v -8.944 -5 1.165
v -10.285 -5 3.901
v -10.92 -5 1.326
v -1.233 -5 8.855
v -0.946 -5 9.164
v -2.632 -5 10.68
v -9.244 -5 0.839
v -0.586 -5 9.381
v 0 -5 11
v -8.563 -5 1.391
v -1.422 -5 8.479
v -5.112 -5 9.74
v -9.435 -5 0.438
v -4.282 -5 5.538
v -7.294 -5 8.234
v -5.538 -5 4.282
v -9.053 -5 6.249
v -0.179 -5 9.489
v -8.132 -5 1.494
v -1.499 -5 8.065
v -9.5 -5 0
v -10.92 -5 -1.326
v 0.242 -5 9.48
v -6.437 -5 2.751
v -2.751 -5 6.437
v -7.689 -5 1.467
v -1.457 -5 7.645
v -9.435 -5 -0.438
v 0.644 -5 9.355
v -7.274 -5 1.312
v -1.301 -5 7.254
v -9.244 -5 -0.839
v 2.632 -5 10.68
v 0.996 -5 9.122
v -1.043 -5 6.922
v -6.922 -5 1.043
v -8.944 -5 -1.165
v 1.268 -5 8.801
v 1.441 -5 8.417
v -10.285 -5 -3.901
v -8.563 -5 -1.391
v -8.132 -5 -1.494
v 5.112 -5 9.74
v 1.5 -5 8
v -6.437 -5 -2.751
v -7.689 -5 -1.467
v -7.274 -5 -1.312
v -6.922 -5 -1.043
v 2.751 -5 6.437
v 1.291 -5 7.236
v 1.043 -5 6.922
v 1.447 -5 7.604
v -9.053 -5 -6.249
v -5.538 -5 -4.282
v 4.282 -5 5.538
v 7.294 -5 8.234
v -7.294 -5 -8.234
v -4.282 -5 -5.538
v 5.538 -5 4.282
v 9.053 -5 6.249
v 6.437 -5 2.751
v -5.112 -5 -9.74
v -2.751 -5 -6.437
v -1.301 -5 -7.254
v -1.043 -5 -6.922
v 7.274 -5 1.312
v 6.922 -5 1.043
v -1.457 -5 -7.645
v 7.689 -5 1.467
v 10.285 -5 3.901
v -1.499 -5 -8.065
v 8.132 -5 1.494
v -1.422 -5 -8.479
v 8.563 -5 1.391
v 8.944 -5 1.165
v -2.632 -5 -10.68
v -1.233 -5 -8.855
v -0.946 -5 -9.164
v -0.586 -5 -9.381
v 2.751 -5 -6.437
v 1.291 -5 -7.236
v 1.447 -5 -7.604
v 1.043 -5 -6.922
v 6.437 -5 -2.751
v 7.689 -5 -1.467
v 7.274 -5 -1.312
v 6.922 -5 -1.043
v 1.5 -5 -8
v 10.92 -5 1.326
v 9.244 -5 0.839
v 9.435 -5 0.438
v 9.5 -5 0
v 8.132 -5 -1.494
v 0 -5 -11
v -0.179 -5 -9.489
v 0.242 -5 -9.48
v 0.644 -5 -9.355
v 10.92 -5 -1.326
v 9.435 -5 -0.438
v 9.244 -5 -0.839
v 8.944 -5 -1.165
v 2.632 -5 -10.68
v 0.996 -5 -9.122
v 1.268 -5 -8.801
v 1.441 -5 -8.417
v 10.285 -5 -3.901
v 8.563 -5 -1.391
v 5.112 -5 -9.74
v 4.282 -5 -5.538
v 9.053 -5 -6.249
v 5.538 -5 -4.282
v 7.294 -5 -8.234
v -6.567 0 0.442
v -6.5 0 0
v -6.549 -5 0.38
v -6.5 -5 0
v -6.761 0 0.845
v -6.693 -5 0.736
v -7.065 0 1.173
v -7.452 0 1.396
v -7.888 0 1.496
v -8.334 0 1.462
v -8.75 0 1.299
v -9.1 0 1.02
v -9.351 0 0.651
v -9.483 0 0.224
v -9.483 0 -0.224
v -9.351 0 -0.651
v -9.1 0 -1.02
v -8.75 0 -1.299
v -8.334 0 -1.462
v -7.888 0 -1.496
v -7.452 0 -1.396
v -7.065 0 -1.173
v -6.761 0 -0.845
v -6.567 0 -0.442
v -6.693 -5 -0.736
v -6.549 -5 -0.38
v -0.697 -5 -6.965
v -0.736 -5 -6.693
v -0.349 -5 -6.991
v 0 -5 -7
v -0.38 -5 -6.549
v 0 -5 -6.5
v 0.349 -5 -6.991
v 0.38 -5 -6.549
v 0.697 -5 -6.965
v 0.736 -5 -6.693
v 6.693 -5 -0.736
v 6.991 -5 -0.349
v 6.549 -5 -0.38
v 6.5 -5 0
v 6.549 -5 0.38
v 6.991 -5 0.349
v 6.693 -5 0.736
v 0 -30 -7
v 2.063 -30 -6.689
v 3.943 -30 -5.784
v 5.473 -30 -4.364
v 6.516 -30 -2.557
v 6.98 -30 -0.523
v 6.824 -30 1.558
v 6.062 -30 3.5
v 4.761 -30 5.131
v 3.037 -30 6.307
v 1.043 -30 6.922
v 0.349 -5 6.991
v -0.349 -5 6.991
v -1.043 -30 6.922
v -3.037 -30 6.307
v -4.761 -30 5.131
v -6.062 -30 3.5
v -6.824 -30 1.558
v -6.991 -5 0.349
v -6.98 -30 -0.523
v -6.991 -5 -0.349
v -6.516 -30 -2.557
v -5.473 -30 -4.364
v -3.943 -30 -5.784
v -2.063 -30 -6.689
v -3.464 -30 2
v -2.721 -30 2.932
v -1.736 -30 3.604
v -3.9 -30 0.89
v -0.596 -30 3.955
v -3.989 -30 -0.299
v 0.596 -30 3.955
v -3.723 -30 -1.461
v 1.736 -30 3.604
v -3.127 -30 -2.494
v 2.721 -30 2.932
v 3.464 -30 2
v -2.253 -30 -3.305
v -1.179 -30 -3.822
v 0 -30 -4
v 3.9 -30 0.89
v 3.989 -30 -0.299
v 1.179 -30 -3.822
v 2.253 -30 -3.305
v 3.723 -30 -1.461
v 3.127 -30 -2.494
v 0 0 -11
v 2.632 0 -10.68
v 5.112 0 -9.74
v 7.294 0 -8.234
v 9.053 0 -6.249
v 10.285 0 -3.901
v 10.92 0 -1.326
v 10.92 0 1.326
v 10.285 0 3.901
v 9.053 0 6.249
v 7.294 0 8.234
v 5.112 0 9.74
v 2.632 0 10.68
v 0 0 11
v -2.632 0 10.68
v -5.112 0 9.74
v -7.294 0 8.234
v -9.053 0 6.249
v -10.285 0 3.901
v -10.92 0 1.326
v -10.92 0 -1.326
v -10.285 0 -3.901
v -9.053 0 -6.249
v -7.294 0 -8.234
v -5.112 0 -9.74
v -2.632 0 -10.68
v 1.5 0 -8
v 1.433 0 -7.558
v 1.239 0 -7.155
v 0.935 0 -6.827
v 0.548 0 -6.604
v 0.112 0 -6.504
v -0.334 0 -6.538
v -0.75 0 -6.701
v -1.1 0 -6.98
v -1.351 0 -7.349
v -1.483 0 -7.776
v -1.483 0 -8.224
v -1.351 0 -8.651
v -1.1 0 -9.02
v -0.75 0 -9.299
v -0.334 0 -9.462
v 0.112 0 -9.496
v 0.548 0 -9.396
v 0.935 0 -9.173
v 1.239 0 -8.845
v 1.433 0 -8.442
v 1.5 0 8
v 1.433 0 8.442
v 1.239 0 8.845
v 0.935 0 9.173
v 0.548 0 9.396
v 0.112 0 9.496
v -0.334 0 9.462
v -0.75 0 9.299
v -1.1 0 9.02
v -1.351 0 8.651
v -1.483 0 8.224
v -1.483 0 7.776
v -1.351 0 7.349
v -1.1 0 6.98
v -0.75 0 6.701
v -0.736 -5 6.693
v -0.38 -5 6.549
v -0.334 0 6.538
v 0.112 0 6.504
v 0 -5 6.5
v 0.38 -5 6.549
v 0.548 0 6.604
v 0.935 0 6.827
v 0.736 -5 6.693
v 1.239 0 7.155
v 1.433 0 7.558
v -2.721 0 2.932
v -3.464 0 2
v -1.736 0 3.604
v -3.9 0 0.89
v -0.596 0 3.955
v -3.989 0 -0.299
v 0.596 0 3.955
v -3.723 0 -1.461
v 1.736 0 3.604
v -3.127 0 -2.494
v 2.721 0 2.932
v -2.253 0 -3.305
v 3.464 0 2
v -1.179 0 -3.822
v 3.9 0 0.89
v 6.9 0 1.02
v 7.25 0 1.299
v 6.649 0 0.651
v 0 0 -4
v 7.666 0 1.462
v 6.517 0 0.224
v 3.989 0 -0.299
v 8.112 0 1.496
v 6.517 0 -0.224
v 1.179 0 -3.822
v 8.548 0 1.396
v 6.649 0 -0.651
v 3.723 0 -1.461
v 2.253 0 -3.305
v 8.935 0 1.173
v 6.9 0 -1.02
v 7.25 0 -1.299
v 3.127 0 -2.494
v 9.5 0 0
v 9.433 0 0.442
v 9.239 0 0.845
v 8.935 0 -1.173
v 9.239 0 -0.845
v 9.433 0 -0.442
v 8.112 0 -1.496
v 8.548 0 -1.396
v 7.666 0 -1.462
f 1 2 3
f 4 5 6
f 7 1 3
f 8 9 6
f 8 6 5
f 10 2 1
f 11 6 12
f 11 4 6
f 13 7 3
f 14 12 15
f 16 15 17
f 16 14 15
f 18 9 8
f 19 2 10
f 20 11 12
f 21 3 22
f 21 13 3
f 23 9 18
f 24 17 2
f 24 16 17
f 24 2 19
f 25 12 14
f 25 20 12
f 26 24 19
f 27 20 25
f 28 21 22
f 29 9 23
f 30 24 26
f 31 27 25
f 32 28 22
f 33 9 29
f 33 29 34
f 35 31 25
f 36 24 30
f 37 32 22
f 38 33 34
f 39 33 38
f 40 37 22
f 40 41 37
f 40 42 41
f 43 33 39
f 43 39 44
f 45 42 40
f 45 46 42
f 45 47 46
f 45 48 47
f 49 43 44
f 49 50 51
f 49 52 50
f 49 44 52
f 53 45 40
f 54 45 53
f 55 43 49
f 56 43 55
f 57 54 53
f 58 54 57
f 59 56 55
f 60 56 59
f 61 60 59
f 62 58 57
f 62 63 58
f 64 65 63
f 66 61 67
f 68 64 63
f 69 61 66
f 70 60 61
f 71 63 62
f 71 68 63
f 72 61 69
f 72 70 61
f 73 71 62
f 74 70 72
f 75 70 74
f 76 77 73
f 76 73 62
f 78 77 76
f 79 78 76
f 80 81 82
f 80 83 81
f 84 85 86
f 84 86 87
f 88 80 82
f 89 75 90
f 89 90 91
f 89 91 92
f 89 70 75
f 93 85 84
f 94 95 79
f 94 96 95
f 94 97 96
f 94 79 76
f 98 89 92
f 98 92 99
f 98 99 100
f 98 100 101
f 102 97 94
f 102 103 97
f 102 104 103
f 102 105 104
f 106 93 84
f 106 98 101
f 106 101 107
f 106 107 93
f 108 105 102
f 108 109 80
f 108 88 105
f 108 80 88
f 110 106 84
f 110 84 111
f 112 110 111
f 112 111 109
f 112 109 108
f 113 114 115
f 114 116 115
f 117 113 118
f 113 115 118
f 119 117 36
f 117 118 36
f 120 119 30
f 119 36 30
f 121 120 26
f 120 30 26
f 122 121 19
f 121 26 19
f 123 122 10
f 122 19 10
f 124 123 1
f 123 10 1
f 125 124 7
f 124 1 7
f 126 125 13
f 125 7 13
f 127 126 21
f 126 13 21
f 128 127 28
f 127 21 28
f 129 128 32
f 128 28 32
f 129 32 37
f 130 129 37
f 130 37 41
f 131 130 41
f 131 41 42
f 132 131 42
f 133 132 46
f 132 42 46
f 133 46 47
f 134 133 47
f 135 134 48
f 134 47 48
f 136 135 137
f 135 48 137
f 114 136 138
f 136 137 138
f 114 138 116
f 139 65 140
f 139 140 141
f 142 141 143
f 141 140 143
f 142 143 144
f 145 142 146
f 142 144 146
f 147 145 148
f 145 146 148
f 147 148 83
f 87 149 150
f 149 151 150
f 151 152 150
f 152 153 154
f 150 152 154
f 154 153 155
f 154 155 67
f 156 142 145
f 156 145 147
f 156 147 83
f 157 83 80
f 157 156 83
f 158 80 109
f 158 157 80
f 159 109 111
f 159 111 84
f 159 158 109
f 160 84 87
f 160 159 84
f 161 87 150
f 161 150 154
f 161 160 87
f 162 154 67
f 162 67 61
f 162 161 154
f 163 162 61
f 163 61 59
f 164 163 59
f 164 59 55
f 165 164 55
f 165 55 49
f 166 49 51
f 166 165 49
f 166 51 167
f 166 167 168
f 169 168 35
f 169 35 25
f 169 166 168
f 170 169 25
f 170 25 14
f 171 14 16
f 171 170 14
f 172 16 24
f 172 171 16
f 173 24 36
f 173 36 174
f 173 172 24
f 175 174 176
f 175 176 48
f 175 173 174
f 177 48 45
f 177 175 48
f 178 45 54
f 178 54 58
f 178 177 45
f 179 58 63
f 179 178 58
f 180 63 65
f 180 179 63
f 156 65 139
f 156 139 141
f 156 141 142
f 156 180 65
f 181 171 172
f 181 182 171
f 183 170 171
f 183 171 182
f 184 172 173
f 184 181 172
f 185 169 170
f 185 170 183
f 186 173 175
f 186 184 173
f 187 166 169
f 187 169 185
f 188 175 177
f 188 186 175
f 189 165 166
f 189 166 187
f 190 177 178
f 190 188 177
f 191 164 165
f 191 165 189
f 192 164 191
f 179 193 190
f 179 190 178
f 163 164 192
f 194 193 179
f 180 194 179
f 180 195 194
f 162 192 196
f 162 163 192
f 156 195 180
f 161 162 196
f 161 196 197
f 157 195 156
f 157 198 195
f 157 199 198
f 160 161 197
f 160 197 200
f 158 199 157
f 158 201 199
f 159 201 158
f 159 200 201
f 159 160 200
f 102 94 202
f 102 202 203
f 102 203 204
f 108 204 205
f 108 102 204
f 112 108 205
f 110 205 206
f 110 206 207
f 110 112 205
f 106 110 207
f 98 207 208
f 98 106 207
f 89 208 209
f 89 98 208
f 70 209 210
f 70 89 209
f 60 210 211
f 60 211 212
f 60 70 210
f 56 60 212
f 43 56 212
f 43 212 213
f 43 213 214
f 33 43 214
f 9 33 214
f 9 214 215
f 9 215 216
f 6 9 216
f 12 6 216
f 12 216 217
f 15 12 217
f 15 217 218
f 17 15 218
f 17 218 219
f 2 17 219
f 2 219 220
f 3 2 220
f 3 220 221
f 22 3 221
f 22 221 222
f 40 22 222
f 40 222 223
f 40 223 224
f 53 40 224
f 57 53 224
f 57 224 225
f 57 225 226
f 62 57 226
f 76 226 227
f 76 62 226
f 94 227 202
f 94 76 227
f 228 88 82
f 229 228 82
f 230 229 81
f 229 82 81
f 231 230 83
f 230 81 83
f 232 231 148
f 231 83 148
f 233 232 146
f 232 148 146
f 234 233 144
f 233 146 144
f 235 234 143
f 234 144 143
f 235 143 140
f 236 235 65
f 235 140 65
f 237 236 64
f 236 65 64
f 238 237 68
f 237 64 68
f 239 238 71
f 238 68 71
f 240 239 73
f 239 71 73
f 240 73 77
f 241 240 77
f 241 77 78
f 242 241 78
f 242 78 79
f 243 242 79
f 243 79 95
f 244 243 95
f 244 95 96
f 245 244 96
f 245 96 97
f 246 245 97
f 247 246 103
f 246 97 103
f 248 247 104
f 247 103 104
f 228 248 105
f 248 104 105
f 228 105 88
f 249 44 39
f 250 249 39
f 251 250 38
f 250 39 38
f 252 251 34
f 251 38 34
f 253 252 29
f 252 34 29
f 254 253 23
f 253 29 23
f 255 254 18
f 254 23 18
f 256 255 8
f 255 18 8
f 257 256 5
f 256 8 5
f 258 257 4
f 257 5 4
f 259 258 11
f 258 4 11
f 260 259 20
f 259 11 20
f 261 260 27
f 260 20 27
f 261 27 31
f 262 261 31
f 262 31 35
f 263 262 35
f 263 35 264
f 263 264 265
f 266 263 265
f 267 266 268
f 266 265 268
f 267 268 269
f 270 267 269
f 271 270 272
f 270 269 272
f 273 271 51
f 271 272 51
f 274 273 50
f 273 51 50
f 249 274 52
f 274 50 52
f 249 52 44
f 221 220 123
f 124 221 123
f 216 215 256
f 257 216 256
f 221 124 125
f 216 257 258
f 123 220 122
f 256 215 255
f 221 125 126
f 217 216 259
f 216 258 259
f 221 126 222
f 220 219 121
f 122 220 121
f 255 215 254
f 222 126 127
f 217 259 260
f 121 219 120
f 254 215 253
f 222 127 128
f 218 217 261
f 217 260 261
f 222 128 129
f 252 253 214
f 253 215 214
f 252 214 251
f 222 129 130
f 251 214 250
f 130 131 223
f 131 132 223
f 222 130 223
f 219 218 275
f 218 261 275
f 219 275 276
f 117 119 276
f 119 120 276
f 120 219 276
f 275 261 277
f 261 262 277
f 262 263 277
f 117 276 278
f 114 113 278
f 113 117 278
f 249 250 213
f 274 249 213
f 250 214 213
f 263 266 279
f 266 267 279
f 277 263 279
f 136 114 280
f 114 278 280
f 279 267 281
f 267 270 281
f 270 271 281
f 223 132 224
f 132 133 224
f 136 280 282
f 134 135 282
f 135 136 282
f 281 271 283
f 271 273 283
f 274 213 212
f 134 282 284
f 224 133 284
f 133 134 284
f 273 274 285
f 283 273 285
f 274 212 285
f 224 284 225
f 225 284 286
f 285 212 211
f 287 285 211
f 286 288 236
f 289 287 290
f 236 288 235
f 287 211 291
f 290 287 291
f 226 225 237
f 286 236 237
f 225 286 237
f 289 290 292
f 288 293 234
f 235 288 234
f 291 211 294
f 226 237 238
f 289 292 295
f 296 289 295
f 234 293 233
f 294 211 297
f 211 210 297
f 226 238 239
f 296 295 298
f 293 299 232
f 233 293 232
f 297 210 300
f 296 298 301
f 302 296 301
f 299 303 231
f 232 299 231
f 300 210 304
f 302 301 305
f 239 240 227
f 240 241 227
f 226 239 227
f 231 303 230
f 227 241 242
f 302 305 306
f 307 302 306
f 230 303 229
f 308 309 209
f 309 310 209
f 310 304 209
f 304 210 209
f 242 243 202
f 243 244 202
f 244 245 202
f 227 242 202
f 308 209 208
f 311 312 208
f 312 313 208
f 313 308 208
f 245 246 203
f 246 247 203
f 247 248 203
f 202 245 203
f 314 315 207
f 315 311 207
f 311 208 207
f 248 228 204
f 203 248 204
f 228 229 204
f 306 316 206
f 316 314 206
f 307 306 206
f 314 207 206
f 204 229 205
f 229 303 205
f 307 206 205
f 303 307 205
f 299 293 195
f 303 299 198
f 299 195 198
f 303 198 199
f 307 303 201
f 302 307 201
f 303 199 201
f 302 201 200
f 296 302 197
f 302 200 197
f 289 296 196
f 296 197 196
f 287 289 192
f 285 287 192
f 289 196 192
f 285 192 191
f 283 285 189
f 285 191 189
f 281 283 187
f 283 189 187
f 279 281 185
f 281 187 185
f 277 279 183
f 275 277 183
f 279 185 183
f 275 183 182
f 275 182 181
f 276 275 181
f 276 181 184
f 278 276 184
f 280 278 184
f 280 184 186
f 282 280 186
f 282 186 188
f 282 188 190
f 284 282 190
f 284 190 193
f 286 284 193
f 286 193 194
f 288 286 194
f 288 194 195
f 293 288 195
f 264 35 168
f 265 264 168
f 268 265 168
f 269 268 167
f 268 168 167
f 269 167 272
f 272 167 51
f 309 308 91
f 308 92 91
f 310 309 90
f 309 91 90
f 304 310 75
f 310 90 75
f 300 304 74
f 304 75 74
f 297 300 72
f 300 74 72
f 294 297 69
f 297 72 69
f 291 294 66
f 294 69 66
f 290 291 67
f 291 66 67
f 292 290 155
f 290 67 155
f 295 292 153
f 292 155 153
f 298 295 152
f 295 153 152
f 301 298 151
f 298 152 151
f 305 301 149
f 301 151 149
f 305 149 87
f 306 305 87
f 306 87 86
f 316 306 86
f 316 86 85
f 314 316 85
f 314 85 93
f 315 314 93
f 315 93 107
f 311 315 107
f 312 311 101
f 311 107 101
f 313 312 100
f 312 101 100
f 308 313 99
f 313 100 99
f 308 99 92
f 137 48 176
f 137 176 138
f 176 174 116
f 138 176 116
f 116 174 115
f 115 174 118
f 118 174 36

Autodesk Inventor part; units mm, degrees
ref_plane "YZ Plane" through (0, 0, 0) normal (1, 0, 0) x (0, 1, 0)
ref_plane "XZ Plane" through (0, 0, 0) normal (0, 1, 0) x (-1, 0, 0)
sketch "Sketch1" plane through (0, 0, 0) normal (1, 0, 0) x (0, 1, 0)
  line L0 (0, 0) -> (-84.9068, 0)
  line L1 (0, -4) -> (-84.9068, -4)
  line L2 (0, -4) -> (0, -11)
  line L3 (0, -11) -> (-5, -11)
  line L4 (-5, -11) -> (-5, -7)
  line L5 (-5, -7) -> (-30, -7)
  line L6 (-30, -7) -> (-30, -4)
  dimension "d1" = 4
  dimension "d2" = 11
  dimension "d3" = 5
  dimension "d4" = 4
  dimension "d5" = 25
revolve "Revolution1" add sketch "Sketch1" angle 360 about axis through (0, 0, 0) along (0, -1, 0)
sketch "Sketch2" plane through (0, -5, 0) normal (0, -1, 0) x (1, 0, 0)
  line L0 (0, 0) -> (8, 0)
  circle A0 centre (8, 0) radius 1.5
  circle A1 centre (0, 8) radius 1.5
  circle A2 centre (-8, 0) radius 1.5
  circle A3 centre (0, -8) radius 1.5
  dimension "d7" = 8
  dimension "d8" = 3
  dimension "d11" = 360
extrude "Extrusion1" cut sketch "Sketch2" against normal blind 25.4
ref_plane "Work Plane1" through (-8, -5, 0) normal (0, 0, -1) x (0, 1, 0)
properties part number "standinNut"
